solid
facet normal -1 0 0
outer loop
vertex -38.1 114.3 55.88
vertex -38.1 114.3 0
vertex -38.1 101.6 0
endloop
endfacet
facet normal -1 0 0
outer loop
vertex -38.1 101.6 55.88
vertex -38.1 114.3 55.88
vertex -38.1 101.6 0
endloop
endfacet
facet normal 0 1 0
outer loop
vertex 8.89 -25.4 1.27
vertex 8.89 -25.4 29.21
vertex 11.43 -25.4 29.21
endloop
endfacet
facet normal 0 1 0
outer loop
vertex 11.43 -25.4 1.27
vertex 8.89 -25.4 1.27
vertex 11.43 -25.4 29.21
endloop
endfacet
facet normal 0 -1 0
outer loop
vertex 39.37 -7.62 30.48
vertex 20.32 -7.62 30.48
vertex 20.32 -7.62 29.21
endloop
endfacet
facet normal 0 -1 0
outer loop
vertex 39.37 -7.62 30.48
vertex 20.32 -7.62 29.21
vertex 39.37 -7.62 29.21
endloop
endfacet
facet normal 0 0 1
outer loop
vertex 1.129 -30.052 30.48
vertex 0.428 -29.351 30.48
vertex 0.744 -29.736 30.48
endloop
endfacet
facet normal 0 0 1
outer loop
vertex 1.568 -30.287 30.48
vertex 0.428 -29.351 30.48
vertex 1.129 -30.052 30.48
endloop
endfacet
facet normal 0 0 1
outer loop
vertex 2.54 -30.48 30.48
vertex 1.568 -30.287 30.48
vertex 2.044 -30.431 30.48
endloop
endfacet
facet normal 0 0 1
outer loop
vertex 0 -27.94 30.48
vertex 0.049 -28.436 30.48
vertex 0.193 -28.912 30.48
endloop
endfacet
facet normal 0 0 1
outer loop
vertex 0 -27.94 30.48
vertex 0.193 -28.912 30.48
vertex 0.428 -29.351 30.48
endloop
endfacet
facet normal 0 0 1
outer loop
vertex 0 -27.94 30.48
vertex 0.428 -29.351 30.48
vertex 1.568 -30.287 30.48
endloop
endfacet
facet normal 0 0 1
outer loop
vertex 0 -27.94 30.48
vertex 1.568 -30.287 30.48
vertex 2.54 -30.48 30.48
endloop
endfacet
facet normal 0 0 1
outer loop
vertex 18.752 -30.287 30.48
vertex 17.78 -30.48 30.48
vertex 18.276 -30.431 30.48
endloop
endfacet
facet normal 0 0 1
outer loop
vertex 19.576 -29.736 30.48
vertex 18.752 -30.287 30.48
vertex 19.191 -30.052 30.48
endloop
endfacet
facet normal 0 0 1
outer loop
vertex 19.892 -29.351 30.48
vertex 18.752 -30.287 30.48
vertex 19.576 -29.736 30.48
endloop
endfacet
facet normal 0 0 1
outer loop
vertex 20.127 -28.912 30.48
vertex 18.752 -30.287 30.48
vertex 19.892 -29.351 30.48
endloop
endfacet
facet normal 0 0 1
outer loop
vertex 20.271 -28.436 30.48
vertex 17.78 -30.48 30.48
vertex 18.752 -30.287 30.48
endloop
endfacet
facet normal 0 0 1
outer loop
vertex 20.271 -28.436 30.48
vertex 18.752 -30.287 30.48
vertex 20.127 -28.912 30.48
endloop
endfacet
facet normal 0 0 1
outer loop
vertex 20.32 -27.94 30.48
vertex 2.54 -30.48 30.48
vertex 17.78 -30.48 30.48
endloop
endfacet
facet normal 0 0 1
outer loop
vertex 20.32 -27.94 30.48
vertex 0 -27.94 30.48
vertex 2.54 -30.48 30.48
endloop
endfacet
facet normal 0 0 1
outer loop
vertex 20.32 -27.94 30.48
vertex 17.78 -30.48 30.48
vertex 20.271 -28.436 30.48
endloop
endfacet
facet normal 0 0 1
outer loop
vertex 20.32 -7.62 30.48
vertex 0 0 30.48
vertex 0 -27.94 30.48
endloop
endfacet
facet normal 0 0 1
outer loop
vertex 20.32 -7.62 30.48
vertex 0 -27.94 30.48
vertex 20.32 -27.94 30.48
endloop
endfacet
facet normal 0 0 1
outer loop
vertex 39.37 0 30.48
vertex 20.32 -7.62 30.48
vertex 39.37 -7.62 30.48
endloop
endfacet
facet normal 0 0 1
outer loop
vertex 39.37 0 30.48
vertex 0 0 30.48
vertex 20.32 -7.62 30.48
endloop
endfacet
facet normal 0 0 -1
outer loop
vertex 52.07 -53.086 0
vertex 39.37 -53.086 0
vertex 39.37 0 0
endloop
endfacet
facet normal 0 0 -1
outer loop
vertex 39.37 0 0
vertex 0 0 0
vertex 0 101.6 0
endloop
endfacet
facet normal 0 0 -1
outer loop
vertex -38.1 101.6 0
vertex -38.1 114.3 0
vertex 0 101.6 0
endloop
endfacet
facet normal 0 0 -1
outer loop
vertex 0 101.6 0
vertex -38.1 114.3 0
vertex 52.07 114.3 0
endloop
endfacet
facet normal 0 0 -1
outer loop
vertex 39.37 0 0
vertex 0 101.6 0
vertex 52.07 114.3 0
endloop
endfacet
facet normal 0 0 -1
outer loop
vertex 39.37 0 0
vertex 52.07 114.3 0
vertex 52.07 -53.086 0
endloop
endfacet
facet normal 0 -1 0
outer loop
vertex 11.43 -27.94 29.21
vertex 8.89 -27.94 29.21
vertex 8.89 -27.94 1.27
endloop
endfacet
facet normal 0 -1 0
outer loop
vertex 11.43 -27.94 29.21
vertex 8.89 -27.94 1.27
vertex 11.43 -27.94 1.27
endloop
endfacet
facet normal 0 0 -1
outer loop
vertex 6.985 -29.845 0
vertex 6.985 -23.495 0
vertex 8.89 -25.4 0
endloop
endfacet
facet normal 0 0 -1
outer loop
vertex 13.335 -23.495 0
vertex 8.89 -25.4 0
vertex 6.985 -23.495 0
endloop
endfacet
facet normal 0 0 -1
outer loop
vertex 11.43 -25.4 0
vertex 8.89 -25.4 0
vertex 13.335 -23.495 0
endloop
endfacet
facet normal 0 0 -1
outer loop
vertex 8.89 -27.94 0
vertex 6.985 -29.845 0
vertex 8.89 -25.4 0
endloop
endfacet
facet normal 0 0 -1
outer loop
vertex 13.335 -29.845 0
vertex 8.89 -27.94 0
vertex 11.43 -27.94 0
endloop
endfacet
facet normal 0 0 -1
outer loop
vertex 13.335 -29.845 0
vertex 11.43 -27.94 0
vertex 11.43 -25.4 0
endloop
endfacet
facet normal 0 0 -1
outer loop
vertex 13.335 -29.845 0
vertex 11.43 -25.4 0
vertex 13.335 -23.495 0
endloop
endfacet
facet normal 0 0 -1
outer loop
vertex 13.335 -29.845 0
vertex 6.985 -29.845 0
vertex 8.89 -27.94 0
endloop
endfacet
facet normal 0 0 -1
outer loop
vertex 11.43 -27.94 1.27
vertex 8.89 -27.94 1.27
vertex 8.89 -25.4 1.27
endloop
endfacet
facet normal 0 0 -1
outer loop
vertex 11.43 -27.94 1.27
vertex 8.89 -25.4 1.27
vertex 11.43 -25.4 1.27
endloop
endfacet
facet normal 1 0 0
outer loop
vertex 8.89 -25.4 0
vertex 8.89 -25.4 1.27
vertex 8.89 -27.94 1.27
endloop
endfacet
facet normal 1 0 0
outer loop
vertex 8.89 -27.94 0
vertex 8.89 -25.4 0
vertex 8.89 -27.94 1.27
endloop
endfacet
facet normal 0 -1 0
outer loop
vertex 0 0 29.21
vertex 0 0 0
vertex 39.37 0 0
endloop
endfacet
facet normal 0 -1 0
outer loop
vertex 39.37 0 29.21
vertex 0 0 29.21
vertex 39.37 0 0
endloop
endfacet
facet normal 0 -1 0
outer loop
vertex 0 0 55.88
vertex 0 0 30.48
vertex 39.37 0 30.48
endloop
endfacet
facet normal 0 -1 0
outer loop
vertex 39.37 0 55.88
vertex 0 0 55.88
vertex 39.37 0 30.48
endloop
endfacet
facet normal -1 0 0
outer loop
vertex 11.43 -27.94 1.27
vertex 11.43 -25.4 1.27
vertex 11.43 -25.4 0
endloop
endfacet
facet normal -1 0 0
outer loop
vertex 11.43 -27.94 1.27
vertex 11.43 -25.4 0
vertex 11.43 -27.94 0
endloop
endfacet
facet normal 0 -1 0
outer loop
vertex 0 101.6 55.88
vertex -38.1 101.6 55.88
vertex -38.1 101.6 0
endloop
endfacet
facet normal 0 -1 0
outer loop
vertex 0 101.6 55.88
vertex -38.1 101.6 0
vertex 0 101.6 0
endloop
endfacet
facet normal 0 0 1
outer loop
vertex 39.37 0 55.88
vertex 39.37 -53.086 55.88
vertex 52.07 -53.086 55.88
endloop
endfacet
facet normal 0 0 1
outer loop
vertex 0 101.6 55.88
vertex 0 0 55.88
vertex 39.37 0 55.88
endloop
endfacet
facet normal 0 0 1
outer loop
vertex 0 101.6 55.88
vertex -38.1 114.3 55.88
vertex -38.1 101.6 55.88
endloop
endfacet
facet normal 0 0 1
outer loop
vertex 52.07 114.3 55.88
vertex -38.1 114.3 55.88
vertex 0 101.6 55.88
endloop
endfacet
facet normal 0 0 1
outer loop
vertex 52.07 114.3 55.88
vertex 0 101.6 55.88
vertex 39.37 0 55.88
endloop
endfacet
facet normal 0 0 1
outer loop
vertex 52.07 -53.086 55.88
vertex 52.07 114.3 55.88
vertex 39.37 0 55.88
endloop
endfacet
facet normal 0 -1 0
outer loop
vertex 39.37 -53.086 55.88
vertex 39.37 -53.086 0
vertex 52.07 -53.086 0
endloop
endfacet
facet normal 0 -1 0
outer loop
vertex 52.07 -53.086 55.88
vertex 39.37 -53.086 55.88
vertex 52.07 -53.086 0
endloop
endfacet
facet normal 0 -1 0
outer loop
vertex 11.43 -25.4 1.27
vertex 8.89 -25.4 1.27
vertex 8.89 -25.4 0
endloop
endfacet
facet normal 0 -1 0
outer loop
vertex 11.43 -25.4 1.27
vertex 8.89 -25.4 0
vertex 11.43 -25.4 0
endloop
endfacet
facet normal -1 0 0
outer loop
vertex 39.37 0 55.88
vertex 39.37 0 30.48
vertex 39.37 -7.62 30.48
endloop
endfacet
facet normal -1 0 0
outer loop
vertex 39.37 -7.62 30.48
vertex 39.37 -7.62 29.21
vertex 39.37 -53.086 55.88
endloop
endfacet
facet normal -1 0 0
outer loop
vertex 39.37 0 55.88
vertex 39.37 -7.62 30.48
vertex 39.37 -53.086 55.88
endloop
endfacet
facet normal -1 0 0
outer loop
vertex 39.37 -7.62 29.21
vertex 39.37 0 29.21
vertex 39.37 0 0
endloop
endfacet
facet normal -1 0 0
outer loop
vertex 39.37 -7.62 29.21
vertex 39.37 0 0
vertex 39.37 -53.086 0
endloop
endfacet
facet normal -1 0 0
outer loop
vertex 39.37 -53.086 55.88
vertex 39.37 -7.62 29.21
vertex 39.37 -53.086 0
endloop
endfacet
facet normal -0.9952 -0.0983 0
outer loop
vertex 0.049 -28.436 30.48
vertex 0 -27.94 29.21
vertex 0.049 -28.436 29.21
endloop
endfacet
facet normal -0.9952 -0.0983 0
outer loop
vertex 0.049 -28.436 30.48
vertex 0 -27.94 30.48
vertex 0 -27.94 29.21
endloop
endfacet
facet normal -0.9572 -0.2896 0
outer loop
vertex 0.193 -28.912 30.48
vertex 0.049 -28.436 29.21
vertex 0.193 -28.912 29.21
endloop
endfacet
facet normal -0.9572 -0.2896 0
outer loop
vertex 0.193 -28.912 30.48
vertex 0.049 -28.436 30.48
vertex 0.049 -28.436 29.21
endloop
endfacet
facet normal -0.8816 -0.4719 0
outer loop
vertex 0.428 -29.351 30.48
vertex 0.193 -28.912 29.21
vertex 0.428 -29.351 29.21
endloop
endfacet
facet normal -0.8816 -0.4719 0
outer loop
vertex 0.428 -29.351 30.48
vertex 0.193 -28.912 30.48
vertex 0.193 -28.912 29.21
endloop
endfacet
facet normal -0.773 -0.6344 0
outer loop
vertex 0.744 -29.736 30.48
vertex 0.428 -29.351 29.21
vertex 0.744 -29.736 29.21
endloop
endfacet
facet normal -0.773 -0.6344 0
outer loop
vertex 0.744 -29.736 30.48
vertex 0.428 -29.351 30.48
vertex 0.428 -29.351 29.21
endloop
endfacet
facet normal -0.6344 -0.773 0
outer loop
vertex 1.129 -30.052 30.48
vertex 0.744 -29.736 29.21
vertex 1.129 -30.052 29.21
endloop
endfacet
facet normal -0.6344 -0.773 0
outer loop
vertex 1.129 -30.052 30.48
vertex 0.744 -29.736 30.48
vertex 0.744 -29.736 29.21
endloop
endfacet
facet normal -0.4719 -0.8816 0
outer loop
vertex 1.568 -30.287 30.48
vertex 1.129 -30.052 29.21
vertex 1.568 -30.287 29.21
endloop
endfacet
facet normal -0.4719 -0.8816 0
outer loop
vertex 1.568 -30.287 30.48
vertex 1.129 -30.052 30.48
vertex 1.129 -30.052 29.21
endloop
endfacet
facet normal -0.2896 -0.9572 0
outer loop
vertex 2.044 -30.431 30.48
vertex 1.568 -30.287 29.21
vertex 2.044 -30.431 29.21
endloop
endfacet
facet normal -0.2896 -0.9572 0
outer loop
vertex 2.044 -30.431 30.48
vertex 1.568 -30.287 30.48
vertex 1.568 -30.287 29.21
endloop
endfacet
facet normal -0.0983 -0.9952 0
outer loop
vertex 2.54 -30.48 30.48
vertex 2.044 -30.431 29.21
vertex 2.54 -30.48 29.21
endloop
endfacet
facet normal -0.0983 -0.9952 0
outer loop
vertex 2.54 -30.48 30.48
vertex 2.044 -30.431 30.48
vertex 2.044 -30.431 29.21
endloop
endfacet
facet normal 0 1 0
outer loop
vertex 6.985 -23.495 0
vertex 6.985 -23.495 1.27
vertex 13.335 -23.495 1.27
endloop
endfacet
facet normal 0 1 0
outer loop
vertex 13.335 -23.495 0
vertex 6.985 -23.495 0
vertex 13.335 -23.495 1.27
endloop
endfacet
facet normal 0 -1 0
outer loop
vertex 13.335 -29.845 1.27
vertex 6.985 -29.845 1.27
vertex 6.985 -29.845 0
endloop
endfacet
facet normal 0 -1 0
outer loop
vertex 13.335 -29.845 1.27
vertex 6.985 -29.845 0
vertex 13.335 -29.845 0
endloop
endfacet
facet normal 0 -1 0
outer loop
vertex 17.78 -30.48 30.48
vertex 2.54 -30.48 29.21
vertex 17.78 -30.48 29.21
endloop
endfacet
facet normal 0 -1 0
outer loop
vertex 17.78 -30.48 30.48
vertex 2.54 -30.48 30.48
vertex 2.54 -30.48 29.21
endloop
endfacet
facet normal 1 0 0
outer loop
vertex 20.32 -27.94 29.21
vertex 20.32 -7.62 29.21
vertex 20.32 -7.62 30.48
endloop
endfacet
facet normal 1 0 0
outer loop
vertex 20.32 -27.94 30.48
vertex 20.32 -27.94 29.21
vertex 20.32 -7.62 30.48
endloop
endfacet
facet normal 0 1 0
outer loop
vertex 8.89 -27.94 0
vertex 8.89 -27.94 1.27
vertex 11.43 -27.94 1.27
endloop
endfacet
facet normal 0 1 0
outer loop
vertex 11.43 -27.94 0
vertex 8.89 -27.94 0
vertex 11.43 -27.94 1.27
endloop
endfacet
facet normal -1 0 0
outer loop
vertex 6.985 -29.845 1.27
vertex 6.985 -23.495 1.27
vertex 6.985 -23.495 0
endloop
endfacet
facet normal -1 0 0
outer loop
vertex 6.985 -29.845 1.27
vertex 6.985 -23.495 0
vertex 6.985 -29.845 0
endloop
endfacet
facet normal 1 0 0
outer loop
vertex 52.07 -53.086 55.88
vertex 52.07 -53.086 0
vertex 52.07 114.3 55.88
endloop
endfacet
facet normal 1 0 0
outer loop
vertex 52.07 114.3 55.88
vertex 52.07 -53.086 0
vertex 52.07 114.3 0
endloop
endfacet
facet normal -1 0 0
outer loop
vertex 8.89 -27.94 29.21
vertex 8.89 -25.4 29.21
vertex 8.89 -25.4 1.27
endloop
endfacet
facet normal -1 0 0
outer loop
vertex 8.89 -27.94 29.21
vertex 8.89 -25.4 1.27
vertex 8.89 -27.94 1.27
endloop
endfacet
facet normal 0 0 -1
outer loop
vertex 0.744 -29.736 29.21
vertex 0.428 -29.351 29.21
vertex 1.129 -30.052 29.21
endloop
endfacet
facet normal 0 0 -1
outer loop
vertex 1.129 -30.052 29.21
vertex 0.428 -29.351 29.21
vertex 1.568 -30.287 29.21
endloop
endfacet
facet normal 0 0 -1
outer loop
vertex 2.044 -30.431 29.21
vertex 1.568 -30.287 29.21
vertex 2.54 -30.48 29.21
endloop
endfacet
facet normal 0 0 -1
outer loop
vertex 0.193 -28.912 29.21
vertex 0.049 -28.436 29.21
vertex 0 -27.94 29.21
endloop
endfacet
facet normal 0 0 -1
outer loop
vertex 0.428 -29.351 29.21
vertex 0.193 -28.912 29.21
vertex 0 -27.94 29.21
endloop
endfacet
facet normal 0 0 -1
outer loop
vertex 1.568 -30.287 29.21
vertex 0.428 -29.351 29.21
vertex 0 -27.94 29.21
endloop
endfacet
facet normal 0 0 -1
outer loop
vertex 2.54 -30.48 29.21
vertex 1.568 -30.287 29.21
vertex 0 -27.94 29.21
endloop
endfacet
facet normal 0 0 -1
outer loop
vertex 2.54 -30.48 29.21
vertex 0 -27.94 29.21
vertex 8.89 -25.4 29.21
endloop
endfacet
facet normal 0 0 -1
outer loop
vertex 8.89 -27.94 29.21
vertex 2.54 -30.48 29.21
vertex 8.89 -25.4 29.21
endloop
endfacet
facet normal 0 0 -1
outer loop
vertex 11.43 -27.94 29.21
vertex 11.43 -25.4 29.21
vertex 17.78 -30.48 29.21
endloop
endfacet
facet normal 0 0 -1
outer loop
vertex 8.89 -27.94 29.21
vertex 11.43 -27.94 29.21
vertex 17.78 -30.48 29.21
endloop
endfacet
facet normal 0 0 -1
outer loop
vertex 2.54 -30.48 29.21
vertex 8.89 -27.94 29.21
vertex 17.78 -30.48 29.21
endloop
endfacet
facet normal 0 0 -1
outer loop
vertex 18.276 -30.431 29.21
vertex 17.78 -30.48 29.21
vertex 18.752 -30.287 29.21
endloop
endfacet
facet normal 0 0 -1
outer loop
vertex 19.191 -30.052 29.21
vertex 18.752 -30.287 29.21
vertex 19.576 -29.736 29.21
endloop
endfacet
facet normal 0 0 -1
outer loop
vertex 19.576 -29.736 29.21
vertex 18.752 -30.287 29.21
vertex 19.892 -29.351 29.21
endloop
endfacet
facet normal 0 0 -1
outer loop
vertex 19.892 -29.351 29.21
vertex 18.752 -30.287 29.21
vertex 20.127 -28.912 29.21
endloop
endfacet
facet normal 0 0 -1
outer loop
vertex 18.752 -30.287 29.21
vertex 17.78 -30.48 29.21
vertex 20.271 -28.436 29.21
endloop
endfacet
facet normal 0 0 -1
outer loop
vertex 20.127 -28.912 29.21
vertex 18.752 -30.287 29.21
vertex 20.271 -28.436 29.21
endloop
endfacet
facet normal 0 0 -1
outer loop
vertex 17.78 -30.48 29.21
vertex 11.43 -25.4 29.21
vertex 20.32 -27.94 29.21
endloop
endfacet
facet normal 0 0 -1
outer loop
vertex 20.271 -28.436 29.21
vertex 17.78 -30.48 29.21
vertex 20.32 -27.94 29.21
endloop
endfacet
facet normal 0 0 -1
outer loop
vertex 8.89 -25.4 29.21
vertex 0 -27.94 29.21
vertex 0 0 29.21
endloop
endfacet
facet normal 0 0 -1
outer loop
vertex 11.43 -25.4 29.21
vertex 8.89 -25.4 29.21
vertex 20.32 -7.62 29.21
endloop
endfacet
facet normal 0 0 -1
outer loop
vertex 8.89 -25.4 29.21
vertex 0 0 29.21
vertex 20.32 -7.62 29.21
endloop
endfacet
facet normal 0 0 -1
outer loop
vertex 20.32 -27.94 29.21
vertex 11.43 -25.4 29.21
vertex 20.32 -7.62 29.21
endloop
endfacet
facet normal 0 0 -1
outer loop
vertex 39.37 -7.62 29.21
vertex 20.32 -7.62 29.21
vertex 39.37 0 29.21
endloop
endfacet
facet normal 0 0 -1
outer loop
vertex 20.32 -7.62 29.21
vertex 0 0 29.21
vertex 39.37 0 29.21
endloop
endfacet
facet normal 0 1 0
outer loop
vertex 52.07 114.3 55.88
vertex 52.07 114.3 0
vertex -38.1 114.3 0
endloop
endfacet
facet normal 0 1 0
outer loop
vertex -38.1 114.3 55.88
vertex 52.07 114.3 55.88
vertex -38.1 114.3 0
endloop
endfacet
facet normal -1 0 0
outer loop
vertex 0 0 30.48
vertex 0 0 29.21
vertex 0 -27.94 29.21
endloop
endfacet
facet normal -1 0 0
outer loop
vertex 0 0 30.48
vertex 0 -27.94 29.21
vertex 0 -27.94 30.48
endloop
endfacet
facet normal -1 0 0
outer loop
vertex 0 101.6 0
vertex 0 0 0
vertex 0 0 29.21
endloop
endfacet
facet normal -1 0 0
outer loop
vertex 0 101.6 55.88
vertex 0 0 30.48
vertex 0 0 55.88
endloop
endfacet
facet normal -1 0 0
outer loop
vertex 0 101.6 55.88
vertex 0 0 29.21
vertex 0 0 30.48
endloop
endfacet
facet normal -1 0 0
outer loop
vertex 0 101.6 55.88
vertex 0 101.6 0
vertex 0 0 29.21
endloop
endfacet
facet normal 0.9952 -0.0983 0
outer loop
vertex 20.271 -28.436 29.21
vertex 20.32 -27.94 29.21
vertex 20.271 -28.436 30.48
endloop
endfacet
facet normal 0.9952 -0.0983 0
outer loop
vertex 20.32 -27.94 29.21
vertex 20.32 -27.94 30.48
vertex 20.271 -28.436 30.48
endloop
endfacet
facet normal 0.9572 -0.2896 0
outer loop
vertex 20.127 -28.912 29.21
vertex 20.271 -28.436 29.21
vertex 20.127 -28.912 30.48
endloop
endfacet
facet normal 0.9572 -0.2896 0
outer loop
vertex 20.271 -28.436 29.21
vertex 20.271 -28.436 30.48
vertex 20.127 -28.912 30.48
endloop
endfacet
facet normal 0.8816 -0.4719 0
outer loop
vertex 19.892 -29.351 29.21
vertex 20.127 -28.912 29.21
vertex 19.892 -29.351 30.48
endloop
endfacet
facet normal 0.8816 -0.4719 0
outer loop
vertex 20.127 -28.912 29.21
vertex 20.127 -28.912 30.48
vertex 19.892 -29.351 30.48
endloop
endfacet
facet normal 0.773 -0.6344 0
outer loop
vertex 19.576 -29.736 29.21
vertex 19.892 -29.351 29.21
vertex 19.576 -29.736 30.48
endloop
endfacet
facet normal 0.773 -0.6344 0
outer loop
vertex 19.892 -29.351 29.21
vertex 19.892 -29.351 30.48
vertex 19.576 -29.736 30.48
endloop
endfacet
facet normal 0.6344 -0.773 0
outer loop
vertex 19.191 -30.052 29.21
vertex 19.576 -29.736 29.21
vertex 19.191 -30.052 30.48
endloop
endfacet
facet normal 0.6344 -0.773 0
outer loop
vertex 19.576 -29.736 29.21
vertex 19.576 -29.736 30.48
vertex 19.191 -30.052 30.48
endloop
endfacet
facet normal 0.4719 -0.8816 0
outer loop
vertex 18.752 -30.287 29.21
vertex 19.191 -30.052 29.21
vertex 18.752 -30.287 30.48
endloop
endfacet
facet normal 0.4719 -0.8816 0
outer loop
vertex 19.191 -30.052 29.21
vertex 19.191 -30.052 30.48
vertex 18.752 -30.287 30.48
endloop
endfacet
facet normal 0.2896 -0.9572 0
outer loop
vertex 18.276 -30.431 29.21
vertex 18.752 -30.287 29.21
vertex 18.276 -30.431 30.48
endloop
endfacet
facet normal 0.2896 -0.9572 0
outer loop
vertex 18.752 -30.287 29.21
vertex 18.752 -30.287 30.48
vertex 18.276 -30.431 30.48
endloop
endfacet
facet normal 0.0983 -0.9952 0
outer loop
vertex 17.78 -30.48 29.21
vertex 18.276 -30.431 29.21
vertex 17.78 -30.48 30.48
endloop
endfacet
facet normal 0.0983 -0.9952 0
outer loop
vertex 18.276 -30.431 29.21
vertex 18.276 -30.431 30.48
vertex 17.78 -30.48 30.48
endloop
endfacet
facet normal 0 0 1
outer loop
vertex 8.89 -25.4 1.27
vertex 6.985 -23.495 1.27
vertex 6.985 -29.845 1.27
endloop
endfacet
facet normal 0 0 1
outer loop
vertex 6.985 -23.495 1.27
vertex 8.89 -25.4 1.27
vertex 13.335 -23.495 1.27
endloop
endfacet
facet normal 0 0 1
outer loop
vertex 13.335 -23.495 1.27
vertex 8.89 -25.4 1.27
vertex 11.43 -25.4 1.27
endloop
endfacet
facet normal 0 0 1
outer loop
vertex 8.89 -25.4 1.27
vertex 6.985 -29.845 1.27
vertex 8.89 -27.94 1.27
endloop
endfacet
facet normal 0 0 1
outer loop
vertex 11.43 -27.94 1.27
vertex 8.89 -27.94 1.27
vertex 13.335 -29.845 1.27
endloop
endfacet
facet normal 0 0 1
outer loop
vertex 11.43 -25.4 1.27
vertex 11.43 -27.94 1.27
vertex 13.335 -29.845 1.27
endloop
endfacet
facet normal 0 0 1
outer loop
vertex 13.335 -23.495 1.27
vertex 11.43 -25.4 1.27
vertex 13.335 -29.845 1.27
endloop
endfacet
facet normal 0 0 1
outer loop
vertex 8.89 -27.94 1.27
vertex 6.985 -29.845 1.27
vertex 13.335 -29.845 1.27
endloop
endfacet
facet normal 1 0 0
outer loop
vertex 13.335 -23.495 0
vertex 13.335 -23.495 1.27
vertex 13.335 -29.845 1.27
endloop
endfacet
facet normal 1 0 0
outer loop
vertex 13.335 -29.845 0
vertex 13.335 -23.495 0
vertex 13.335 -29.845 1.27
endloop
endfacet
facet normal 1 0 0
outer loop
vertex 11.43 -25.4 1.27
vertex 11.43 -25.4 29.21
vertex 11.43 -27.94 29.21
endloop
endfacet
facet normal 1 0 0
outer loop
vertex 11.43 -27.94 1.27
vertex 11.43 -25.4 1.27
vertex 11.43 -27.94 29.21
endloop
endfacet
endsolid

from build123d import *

# Parameters (mm, degrees)
F1_DEPTH  = 55.88
F2_W      = 39.37
F2_H      = 1.27
F3_DEPTH  = 7.62
F4_W      = 20.32
F4_H      = 1.27
F5_DEPTH  = 22.86
F6_R      = 2.54
F7_W      = 2.54
F7_H      = 2.54
F8_DEPTH  = 27.94
F9_W      = 6.35
F9_H      = 6.35
F9_W_2    = 2.54
F9_H_2    = 2.54
F10_DEPTH = 1.27


with BuildPart() as f1:
    # F0 (on Top) → F1 (new body)
    with BuildSketch(Plane.XY):
        Polygon((0, 101.6), (0, 0), (39.37, 0), (39.37, -53.086), (52.07, -53.086), (52.07, 114.3), (-38.1, 114.3), (-38.1, 101.6), align=None)
    extrude(amount=F1_DEPTH)

    # F2 (on face) → F3 (join)
    with BuildSketch(Plane.XZ):
        with Locations((19.685, 29.845)):
            Rectangle(F2_W, F2_H)
    extrude(amount=F3_DEPTH)

    # F4 (on face) → F5 (join)
    with BuildSketch(Plane.XZ.offset(7.62)):
        with Locations((10.16, 29.845)):
            Rectangle(F4_W, F4_H)
    extrude(amount=F5_DEPTH)

    # F6
    f6_edges = [f1.edges().sort_by_distance(p)[0] for p in [
        (0, -30.48, 29.845),
        (20.32, -30.48, 29.845),
    ]]
    fillet(f6_edges, radius=F6_R)

    # F7 (on face) → F8 (join)
    with BuildSketch(Plane(origin=(0, 0, 29.21), x_dir=(1, 0, 0), z_dir=(0, 0, -1))):
        with Locations((10.16, 26.67)):
            Rectangle(F7_W, F7_H)
    extrude(amount=F8_DEPTH)


with BuildPart() as f10:
    # F9 (on face) → F10 (new body)
    with BuildSketch(Plane(origin=(0, 0, 1.27), x_dir=(1, 0, 0), z_dir=(0, 0, -1))):
        with Locations((10.16, 26.67)):
            Rectangle(F9_W, F9_H)
        with Locations((10.16, 26.67)):
            Rectangle(F9_W_2, F9_H_2, mode=Mode.SUBTRACT)
    extrude(amount=F10_DEPTH)


solid = Compound([f1.part, f10.part])
